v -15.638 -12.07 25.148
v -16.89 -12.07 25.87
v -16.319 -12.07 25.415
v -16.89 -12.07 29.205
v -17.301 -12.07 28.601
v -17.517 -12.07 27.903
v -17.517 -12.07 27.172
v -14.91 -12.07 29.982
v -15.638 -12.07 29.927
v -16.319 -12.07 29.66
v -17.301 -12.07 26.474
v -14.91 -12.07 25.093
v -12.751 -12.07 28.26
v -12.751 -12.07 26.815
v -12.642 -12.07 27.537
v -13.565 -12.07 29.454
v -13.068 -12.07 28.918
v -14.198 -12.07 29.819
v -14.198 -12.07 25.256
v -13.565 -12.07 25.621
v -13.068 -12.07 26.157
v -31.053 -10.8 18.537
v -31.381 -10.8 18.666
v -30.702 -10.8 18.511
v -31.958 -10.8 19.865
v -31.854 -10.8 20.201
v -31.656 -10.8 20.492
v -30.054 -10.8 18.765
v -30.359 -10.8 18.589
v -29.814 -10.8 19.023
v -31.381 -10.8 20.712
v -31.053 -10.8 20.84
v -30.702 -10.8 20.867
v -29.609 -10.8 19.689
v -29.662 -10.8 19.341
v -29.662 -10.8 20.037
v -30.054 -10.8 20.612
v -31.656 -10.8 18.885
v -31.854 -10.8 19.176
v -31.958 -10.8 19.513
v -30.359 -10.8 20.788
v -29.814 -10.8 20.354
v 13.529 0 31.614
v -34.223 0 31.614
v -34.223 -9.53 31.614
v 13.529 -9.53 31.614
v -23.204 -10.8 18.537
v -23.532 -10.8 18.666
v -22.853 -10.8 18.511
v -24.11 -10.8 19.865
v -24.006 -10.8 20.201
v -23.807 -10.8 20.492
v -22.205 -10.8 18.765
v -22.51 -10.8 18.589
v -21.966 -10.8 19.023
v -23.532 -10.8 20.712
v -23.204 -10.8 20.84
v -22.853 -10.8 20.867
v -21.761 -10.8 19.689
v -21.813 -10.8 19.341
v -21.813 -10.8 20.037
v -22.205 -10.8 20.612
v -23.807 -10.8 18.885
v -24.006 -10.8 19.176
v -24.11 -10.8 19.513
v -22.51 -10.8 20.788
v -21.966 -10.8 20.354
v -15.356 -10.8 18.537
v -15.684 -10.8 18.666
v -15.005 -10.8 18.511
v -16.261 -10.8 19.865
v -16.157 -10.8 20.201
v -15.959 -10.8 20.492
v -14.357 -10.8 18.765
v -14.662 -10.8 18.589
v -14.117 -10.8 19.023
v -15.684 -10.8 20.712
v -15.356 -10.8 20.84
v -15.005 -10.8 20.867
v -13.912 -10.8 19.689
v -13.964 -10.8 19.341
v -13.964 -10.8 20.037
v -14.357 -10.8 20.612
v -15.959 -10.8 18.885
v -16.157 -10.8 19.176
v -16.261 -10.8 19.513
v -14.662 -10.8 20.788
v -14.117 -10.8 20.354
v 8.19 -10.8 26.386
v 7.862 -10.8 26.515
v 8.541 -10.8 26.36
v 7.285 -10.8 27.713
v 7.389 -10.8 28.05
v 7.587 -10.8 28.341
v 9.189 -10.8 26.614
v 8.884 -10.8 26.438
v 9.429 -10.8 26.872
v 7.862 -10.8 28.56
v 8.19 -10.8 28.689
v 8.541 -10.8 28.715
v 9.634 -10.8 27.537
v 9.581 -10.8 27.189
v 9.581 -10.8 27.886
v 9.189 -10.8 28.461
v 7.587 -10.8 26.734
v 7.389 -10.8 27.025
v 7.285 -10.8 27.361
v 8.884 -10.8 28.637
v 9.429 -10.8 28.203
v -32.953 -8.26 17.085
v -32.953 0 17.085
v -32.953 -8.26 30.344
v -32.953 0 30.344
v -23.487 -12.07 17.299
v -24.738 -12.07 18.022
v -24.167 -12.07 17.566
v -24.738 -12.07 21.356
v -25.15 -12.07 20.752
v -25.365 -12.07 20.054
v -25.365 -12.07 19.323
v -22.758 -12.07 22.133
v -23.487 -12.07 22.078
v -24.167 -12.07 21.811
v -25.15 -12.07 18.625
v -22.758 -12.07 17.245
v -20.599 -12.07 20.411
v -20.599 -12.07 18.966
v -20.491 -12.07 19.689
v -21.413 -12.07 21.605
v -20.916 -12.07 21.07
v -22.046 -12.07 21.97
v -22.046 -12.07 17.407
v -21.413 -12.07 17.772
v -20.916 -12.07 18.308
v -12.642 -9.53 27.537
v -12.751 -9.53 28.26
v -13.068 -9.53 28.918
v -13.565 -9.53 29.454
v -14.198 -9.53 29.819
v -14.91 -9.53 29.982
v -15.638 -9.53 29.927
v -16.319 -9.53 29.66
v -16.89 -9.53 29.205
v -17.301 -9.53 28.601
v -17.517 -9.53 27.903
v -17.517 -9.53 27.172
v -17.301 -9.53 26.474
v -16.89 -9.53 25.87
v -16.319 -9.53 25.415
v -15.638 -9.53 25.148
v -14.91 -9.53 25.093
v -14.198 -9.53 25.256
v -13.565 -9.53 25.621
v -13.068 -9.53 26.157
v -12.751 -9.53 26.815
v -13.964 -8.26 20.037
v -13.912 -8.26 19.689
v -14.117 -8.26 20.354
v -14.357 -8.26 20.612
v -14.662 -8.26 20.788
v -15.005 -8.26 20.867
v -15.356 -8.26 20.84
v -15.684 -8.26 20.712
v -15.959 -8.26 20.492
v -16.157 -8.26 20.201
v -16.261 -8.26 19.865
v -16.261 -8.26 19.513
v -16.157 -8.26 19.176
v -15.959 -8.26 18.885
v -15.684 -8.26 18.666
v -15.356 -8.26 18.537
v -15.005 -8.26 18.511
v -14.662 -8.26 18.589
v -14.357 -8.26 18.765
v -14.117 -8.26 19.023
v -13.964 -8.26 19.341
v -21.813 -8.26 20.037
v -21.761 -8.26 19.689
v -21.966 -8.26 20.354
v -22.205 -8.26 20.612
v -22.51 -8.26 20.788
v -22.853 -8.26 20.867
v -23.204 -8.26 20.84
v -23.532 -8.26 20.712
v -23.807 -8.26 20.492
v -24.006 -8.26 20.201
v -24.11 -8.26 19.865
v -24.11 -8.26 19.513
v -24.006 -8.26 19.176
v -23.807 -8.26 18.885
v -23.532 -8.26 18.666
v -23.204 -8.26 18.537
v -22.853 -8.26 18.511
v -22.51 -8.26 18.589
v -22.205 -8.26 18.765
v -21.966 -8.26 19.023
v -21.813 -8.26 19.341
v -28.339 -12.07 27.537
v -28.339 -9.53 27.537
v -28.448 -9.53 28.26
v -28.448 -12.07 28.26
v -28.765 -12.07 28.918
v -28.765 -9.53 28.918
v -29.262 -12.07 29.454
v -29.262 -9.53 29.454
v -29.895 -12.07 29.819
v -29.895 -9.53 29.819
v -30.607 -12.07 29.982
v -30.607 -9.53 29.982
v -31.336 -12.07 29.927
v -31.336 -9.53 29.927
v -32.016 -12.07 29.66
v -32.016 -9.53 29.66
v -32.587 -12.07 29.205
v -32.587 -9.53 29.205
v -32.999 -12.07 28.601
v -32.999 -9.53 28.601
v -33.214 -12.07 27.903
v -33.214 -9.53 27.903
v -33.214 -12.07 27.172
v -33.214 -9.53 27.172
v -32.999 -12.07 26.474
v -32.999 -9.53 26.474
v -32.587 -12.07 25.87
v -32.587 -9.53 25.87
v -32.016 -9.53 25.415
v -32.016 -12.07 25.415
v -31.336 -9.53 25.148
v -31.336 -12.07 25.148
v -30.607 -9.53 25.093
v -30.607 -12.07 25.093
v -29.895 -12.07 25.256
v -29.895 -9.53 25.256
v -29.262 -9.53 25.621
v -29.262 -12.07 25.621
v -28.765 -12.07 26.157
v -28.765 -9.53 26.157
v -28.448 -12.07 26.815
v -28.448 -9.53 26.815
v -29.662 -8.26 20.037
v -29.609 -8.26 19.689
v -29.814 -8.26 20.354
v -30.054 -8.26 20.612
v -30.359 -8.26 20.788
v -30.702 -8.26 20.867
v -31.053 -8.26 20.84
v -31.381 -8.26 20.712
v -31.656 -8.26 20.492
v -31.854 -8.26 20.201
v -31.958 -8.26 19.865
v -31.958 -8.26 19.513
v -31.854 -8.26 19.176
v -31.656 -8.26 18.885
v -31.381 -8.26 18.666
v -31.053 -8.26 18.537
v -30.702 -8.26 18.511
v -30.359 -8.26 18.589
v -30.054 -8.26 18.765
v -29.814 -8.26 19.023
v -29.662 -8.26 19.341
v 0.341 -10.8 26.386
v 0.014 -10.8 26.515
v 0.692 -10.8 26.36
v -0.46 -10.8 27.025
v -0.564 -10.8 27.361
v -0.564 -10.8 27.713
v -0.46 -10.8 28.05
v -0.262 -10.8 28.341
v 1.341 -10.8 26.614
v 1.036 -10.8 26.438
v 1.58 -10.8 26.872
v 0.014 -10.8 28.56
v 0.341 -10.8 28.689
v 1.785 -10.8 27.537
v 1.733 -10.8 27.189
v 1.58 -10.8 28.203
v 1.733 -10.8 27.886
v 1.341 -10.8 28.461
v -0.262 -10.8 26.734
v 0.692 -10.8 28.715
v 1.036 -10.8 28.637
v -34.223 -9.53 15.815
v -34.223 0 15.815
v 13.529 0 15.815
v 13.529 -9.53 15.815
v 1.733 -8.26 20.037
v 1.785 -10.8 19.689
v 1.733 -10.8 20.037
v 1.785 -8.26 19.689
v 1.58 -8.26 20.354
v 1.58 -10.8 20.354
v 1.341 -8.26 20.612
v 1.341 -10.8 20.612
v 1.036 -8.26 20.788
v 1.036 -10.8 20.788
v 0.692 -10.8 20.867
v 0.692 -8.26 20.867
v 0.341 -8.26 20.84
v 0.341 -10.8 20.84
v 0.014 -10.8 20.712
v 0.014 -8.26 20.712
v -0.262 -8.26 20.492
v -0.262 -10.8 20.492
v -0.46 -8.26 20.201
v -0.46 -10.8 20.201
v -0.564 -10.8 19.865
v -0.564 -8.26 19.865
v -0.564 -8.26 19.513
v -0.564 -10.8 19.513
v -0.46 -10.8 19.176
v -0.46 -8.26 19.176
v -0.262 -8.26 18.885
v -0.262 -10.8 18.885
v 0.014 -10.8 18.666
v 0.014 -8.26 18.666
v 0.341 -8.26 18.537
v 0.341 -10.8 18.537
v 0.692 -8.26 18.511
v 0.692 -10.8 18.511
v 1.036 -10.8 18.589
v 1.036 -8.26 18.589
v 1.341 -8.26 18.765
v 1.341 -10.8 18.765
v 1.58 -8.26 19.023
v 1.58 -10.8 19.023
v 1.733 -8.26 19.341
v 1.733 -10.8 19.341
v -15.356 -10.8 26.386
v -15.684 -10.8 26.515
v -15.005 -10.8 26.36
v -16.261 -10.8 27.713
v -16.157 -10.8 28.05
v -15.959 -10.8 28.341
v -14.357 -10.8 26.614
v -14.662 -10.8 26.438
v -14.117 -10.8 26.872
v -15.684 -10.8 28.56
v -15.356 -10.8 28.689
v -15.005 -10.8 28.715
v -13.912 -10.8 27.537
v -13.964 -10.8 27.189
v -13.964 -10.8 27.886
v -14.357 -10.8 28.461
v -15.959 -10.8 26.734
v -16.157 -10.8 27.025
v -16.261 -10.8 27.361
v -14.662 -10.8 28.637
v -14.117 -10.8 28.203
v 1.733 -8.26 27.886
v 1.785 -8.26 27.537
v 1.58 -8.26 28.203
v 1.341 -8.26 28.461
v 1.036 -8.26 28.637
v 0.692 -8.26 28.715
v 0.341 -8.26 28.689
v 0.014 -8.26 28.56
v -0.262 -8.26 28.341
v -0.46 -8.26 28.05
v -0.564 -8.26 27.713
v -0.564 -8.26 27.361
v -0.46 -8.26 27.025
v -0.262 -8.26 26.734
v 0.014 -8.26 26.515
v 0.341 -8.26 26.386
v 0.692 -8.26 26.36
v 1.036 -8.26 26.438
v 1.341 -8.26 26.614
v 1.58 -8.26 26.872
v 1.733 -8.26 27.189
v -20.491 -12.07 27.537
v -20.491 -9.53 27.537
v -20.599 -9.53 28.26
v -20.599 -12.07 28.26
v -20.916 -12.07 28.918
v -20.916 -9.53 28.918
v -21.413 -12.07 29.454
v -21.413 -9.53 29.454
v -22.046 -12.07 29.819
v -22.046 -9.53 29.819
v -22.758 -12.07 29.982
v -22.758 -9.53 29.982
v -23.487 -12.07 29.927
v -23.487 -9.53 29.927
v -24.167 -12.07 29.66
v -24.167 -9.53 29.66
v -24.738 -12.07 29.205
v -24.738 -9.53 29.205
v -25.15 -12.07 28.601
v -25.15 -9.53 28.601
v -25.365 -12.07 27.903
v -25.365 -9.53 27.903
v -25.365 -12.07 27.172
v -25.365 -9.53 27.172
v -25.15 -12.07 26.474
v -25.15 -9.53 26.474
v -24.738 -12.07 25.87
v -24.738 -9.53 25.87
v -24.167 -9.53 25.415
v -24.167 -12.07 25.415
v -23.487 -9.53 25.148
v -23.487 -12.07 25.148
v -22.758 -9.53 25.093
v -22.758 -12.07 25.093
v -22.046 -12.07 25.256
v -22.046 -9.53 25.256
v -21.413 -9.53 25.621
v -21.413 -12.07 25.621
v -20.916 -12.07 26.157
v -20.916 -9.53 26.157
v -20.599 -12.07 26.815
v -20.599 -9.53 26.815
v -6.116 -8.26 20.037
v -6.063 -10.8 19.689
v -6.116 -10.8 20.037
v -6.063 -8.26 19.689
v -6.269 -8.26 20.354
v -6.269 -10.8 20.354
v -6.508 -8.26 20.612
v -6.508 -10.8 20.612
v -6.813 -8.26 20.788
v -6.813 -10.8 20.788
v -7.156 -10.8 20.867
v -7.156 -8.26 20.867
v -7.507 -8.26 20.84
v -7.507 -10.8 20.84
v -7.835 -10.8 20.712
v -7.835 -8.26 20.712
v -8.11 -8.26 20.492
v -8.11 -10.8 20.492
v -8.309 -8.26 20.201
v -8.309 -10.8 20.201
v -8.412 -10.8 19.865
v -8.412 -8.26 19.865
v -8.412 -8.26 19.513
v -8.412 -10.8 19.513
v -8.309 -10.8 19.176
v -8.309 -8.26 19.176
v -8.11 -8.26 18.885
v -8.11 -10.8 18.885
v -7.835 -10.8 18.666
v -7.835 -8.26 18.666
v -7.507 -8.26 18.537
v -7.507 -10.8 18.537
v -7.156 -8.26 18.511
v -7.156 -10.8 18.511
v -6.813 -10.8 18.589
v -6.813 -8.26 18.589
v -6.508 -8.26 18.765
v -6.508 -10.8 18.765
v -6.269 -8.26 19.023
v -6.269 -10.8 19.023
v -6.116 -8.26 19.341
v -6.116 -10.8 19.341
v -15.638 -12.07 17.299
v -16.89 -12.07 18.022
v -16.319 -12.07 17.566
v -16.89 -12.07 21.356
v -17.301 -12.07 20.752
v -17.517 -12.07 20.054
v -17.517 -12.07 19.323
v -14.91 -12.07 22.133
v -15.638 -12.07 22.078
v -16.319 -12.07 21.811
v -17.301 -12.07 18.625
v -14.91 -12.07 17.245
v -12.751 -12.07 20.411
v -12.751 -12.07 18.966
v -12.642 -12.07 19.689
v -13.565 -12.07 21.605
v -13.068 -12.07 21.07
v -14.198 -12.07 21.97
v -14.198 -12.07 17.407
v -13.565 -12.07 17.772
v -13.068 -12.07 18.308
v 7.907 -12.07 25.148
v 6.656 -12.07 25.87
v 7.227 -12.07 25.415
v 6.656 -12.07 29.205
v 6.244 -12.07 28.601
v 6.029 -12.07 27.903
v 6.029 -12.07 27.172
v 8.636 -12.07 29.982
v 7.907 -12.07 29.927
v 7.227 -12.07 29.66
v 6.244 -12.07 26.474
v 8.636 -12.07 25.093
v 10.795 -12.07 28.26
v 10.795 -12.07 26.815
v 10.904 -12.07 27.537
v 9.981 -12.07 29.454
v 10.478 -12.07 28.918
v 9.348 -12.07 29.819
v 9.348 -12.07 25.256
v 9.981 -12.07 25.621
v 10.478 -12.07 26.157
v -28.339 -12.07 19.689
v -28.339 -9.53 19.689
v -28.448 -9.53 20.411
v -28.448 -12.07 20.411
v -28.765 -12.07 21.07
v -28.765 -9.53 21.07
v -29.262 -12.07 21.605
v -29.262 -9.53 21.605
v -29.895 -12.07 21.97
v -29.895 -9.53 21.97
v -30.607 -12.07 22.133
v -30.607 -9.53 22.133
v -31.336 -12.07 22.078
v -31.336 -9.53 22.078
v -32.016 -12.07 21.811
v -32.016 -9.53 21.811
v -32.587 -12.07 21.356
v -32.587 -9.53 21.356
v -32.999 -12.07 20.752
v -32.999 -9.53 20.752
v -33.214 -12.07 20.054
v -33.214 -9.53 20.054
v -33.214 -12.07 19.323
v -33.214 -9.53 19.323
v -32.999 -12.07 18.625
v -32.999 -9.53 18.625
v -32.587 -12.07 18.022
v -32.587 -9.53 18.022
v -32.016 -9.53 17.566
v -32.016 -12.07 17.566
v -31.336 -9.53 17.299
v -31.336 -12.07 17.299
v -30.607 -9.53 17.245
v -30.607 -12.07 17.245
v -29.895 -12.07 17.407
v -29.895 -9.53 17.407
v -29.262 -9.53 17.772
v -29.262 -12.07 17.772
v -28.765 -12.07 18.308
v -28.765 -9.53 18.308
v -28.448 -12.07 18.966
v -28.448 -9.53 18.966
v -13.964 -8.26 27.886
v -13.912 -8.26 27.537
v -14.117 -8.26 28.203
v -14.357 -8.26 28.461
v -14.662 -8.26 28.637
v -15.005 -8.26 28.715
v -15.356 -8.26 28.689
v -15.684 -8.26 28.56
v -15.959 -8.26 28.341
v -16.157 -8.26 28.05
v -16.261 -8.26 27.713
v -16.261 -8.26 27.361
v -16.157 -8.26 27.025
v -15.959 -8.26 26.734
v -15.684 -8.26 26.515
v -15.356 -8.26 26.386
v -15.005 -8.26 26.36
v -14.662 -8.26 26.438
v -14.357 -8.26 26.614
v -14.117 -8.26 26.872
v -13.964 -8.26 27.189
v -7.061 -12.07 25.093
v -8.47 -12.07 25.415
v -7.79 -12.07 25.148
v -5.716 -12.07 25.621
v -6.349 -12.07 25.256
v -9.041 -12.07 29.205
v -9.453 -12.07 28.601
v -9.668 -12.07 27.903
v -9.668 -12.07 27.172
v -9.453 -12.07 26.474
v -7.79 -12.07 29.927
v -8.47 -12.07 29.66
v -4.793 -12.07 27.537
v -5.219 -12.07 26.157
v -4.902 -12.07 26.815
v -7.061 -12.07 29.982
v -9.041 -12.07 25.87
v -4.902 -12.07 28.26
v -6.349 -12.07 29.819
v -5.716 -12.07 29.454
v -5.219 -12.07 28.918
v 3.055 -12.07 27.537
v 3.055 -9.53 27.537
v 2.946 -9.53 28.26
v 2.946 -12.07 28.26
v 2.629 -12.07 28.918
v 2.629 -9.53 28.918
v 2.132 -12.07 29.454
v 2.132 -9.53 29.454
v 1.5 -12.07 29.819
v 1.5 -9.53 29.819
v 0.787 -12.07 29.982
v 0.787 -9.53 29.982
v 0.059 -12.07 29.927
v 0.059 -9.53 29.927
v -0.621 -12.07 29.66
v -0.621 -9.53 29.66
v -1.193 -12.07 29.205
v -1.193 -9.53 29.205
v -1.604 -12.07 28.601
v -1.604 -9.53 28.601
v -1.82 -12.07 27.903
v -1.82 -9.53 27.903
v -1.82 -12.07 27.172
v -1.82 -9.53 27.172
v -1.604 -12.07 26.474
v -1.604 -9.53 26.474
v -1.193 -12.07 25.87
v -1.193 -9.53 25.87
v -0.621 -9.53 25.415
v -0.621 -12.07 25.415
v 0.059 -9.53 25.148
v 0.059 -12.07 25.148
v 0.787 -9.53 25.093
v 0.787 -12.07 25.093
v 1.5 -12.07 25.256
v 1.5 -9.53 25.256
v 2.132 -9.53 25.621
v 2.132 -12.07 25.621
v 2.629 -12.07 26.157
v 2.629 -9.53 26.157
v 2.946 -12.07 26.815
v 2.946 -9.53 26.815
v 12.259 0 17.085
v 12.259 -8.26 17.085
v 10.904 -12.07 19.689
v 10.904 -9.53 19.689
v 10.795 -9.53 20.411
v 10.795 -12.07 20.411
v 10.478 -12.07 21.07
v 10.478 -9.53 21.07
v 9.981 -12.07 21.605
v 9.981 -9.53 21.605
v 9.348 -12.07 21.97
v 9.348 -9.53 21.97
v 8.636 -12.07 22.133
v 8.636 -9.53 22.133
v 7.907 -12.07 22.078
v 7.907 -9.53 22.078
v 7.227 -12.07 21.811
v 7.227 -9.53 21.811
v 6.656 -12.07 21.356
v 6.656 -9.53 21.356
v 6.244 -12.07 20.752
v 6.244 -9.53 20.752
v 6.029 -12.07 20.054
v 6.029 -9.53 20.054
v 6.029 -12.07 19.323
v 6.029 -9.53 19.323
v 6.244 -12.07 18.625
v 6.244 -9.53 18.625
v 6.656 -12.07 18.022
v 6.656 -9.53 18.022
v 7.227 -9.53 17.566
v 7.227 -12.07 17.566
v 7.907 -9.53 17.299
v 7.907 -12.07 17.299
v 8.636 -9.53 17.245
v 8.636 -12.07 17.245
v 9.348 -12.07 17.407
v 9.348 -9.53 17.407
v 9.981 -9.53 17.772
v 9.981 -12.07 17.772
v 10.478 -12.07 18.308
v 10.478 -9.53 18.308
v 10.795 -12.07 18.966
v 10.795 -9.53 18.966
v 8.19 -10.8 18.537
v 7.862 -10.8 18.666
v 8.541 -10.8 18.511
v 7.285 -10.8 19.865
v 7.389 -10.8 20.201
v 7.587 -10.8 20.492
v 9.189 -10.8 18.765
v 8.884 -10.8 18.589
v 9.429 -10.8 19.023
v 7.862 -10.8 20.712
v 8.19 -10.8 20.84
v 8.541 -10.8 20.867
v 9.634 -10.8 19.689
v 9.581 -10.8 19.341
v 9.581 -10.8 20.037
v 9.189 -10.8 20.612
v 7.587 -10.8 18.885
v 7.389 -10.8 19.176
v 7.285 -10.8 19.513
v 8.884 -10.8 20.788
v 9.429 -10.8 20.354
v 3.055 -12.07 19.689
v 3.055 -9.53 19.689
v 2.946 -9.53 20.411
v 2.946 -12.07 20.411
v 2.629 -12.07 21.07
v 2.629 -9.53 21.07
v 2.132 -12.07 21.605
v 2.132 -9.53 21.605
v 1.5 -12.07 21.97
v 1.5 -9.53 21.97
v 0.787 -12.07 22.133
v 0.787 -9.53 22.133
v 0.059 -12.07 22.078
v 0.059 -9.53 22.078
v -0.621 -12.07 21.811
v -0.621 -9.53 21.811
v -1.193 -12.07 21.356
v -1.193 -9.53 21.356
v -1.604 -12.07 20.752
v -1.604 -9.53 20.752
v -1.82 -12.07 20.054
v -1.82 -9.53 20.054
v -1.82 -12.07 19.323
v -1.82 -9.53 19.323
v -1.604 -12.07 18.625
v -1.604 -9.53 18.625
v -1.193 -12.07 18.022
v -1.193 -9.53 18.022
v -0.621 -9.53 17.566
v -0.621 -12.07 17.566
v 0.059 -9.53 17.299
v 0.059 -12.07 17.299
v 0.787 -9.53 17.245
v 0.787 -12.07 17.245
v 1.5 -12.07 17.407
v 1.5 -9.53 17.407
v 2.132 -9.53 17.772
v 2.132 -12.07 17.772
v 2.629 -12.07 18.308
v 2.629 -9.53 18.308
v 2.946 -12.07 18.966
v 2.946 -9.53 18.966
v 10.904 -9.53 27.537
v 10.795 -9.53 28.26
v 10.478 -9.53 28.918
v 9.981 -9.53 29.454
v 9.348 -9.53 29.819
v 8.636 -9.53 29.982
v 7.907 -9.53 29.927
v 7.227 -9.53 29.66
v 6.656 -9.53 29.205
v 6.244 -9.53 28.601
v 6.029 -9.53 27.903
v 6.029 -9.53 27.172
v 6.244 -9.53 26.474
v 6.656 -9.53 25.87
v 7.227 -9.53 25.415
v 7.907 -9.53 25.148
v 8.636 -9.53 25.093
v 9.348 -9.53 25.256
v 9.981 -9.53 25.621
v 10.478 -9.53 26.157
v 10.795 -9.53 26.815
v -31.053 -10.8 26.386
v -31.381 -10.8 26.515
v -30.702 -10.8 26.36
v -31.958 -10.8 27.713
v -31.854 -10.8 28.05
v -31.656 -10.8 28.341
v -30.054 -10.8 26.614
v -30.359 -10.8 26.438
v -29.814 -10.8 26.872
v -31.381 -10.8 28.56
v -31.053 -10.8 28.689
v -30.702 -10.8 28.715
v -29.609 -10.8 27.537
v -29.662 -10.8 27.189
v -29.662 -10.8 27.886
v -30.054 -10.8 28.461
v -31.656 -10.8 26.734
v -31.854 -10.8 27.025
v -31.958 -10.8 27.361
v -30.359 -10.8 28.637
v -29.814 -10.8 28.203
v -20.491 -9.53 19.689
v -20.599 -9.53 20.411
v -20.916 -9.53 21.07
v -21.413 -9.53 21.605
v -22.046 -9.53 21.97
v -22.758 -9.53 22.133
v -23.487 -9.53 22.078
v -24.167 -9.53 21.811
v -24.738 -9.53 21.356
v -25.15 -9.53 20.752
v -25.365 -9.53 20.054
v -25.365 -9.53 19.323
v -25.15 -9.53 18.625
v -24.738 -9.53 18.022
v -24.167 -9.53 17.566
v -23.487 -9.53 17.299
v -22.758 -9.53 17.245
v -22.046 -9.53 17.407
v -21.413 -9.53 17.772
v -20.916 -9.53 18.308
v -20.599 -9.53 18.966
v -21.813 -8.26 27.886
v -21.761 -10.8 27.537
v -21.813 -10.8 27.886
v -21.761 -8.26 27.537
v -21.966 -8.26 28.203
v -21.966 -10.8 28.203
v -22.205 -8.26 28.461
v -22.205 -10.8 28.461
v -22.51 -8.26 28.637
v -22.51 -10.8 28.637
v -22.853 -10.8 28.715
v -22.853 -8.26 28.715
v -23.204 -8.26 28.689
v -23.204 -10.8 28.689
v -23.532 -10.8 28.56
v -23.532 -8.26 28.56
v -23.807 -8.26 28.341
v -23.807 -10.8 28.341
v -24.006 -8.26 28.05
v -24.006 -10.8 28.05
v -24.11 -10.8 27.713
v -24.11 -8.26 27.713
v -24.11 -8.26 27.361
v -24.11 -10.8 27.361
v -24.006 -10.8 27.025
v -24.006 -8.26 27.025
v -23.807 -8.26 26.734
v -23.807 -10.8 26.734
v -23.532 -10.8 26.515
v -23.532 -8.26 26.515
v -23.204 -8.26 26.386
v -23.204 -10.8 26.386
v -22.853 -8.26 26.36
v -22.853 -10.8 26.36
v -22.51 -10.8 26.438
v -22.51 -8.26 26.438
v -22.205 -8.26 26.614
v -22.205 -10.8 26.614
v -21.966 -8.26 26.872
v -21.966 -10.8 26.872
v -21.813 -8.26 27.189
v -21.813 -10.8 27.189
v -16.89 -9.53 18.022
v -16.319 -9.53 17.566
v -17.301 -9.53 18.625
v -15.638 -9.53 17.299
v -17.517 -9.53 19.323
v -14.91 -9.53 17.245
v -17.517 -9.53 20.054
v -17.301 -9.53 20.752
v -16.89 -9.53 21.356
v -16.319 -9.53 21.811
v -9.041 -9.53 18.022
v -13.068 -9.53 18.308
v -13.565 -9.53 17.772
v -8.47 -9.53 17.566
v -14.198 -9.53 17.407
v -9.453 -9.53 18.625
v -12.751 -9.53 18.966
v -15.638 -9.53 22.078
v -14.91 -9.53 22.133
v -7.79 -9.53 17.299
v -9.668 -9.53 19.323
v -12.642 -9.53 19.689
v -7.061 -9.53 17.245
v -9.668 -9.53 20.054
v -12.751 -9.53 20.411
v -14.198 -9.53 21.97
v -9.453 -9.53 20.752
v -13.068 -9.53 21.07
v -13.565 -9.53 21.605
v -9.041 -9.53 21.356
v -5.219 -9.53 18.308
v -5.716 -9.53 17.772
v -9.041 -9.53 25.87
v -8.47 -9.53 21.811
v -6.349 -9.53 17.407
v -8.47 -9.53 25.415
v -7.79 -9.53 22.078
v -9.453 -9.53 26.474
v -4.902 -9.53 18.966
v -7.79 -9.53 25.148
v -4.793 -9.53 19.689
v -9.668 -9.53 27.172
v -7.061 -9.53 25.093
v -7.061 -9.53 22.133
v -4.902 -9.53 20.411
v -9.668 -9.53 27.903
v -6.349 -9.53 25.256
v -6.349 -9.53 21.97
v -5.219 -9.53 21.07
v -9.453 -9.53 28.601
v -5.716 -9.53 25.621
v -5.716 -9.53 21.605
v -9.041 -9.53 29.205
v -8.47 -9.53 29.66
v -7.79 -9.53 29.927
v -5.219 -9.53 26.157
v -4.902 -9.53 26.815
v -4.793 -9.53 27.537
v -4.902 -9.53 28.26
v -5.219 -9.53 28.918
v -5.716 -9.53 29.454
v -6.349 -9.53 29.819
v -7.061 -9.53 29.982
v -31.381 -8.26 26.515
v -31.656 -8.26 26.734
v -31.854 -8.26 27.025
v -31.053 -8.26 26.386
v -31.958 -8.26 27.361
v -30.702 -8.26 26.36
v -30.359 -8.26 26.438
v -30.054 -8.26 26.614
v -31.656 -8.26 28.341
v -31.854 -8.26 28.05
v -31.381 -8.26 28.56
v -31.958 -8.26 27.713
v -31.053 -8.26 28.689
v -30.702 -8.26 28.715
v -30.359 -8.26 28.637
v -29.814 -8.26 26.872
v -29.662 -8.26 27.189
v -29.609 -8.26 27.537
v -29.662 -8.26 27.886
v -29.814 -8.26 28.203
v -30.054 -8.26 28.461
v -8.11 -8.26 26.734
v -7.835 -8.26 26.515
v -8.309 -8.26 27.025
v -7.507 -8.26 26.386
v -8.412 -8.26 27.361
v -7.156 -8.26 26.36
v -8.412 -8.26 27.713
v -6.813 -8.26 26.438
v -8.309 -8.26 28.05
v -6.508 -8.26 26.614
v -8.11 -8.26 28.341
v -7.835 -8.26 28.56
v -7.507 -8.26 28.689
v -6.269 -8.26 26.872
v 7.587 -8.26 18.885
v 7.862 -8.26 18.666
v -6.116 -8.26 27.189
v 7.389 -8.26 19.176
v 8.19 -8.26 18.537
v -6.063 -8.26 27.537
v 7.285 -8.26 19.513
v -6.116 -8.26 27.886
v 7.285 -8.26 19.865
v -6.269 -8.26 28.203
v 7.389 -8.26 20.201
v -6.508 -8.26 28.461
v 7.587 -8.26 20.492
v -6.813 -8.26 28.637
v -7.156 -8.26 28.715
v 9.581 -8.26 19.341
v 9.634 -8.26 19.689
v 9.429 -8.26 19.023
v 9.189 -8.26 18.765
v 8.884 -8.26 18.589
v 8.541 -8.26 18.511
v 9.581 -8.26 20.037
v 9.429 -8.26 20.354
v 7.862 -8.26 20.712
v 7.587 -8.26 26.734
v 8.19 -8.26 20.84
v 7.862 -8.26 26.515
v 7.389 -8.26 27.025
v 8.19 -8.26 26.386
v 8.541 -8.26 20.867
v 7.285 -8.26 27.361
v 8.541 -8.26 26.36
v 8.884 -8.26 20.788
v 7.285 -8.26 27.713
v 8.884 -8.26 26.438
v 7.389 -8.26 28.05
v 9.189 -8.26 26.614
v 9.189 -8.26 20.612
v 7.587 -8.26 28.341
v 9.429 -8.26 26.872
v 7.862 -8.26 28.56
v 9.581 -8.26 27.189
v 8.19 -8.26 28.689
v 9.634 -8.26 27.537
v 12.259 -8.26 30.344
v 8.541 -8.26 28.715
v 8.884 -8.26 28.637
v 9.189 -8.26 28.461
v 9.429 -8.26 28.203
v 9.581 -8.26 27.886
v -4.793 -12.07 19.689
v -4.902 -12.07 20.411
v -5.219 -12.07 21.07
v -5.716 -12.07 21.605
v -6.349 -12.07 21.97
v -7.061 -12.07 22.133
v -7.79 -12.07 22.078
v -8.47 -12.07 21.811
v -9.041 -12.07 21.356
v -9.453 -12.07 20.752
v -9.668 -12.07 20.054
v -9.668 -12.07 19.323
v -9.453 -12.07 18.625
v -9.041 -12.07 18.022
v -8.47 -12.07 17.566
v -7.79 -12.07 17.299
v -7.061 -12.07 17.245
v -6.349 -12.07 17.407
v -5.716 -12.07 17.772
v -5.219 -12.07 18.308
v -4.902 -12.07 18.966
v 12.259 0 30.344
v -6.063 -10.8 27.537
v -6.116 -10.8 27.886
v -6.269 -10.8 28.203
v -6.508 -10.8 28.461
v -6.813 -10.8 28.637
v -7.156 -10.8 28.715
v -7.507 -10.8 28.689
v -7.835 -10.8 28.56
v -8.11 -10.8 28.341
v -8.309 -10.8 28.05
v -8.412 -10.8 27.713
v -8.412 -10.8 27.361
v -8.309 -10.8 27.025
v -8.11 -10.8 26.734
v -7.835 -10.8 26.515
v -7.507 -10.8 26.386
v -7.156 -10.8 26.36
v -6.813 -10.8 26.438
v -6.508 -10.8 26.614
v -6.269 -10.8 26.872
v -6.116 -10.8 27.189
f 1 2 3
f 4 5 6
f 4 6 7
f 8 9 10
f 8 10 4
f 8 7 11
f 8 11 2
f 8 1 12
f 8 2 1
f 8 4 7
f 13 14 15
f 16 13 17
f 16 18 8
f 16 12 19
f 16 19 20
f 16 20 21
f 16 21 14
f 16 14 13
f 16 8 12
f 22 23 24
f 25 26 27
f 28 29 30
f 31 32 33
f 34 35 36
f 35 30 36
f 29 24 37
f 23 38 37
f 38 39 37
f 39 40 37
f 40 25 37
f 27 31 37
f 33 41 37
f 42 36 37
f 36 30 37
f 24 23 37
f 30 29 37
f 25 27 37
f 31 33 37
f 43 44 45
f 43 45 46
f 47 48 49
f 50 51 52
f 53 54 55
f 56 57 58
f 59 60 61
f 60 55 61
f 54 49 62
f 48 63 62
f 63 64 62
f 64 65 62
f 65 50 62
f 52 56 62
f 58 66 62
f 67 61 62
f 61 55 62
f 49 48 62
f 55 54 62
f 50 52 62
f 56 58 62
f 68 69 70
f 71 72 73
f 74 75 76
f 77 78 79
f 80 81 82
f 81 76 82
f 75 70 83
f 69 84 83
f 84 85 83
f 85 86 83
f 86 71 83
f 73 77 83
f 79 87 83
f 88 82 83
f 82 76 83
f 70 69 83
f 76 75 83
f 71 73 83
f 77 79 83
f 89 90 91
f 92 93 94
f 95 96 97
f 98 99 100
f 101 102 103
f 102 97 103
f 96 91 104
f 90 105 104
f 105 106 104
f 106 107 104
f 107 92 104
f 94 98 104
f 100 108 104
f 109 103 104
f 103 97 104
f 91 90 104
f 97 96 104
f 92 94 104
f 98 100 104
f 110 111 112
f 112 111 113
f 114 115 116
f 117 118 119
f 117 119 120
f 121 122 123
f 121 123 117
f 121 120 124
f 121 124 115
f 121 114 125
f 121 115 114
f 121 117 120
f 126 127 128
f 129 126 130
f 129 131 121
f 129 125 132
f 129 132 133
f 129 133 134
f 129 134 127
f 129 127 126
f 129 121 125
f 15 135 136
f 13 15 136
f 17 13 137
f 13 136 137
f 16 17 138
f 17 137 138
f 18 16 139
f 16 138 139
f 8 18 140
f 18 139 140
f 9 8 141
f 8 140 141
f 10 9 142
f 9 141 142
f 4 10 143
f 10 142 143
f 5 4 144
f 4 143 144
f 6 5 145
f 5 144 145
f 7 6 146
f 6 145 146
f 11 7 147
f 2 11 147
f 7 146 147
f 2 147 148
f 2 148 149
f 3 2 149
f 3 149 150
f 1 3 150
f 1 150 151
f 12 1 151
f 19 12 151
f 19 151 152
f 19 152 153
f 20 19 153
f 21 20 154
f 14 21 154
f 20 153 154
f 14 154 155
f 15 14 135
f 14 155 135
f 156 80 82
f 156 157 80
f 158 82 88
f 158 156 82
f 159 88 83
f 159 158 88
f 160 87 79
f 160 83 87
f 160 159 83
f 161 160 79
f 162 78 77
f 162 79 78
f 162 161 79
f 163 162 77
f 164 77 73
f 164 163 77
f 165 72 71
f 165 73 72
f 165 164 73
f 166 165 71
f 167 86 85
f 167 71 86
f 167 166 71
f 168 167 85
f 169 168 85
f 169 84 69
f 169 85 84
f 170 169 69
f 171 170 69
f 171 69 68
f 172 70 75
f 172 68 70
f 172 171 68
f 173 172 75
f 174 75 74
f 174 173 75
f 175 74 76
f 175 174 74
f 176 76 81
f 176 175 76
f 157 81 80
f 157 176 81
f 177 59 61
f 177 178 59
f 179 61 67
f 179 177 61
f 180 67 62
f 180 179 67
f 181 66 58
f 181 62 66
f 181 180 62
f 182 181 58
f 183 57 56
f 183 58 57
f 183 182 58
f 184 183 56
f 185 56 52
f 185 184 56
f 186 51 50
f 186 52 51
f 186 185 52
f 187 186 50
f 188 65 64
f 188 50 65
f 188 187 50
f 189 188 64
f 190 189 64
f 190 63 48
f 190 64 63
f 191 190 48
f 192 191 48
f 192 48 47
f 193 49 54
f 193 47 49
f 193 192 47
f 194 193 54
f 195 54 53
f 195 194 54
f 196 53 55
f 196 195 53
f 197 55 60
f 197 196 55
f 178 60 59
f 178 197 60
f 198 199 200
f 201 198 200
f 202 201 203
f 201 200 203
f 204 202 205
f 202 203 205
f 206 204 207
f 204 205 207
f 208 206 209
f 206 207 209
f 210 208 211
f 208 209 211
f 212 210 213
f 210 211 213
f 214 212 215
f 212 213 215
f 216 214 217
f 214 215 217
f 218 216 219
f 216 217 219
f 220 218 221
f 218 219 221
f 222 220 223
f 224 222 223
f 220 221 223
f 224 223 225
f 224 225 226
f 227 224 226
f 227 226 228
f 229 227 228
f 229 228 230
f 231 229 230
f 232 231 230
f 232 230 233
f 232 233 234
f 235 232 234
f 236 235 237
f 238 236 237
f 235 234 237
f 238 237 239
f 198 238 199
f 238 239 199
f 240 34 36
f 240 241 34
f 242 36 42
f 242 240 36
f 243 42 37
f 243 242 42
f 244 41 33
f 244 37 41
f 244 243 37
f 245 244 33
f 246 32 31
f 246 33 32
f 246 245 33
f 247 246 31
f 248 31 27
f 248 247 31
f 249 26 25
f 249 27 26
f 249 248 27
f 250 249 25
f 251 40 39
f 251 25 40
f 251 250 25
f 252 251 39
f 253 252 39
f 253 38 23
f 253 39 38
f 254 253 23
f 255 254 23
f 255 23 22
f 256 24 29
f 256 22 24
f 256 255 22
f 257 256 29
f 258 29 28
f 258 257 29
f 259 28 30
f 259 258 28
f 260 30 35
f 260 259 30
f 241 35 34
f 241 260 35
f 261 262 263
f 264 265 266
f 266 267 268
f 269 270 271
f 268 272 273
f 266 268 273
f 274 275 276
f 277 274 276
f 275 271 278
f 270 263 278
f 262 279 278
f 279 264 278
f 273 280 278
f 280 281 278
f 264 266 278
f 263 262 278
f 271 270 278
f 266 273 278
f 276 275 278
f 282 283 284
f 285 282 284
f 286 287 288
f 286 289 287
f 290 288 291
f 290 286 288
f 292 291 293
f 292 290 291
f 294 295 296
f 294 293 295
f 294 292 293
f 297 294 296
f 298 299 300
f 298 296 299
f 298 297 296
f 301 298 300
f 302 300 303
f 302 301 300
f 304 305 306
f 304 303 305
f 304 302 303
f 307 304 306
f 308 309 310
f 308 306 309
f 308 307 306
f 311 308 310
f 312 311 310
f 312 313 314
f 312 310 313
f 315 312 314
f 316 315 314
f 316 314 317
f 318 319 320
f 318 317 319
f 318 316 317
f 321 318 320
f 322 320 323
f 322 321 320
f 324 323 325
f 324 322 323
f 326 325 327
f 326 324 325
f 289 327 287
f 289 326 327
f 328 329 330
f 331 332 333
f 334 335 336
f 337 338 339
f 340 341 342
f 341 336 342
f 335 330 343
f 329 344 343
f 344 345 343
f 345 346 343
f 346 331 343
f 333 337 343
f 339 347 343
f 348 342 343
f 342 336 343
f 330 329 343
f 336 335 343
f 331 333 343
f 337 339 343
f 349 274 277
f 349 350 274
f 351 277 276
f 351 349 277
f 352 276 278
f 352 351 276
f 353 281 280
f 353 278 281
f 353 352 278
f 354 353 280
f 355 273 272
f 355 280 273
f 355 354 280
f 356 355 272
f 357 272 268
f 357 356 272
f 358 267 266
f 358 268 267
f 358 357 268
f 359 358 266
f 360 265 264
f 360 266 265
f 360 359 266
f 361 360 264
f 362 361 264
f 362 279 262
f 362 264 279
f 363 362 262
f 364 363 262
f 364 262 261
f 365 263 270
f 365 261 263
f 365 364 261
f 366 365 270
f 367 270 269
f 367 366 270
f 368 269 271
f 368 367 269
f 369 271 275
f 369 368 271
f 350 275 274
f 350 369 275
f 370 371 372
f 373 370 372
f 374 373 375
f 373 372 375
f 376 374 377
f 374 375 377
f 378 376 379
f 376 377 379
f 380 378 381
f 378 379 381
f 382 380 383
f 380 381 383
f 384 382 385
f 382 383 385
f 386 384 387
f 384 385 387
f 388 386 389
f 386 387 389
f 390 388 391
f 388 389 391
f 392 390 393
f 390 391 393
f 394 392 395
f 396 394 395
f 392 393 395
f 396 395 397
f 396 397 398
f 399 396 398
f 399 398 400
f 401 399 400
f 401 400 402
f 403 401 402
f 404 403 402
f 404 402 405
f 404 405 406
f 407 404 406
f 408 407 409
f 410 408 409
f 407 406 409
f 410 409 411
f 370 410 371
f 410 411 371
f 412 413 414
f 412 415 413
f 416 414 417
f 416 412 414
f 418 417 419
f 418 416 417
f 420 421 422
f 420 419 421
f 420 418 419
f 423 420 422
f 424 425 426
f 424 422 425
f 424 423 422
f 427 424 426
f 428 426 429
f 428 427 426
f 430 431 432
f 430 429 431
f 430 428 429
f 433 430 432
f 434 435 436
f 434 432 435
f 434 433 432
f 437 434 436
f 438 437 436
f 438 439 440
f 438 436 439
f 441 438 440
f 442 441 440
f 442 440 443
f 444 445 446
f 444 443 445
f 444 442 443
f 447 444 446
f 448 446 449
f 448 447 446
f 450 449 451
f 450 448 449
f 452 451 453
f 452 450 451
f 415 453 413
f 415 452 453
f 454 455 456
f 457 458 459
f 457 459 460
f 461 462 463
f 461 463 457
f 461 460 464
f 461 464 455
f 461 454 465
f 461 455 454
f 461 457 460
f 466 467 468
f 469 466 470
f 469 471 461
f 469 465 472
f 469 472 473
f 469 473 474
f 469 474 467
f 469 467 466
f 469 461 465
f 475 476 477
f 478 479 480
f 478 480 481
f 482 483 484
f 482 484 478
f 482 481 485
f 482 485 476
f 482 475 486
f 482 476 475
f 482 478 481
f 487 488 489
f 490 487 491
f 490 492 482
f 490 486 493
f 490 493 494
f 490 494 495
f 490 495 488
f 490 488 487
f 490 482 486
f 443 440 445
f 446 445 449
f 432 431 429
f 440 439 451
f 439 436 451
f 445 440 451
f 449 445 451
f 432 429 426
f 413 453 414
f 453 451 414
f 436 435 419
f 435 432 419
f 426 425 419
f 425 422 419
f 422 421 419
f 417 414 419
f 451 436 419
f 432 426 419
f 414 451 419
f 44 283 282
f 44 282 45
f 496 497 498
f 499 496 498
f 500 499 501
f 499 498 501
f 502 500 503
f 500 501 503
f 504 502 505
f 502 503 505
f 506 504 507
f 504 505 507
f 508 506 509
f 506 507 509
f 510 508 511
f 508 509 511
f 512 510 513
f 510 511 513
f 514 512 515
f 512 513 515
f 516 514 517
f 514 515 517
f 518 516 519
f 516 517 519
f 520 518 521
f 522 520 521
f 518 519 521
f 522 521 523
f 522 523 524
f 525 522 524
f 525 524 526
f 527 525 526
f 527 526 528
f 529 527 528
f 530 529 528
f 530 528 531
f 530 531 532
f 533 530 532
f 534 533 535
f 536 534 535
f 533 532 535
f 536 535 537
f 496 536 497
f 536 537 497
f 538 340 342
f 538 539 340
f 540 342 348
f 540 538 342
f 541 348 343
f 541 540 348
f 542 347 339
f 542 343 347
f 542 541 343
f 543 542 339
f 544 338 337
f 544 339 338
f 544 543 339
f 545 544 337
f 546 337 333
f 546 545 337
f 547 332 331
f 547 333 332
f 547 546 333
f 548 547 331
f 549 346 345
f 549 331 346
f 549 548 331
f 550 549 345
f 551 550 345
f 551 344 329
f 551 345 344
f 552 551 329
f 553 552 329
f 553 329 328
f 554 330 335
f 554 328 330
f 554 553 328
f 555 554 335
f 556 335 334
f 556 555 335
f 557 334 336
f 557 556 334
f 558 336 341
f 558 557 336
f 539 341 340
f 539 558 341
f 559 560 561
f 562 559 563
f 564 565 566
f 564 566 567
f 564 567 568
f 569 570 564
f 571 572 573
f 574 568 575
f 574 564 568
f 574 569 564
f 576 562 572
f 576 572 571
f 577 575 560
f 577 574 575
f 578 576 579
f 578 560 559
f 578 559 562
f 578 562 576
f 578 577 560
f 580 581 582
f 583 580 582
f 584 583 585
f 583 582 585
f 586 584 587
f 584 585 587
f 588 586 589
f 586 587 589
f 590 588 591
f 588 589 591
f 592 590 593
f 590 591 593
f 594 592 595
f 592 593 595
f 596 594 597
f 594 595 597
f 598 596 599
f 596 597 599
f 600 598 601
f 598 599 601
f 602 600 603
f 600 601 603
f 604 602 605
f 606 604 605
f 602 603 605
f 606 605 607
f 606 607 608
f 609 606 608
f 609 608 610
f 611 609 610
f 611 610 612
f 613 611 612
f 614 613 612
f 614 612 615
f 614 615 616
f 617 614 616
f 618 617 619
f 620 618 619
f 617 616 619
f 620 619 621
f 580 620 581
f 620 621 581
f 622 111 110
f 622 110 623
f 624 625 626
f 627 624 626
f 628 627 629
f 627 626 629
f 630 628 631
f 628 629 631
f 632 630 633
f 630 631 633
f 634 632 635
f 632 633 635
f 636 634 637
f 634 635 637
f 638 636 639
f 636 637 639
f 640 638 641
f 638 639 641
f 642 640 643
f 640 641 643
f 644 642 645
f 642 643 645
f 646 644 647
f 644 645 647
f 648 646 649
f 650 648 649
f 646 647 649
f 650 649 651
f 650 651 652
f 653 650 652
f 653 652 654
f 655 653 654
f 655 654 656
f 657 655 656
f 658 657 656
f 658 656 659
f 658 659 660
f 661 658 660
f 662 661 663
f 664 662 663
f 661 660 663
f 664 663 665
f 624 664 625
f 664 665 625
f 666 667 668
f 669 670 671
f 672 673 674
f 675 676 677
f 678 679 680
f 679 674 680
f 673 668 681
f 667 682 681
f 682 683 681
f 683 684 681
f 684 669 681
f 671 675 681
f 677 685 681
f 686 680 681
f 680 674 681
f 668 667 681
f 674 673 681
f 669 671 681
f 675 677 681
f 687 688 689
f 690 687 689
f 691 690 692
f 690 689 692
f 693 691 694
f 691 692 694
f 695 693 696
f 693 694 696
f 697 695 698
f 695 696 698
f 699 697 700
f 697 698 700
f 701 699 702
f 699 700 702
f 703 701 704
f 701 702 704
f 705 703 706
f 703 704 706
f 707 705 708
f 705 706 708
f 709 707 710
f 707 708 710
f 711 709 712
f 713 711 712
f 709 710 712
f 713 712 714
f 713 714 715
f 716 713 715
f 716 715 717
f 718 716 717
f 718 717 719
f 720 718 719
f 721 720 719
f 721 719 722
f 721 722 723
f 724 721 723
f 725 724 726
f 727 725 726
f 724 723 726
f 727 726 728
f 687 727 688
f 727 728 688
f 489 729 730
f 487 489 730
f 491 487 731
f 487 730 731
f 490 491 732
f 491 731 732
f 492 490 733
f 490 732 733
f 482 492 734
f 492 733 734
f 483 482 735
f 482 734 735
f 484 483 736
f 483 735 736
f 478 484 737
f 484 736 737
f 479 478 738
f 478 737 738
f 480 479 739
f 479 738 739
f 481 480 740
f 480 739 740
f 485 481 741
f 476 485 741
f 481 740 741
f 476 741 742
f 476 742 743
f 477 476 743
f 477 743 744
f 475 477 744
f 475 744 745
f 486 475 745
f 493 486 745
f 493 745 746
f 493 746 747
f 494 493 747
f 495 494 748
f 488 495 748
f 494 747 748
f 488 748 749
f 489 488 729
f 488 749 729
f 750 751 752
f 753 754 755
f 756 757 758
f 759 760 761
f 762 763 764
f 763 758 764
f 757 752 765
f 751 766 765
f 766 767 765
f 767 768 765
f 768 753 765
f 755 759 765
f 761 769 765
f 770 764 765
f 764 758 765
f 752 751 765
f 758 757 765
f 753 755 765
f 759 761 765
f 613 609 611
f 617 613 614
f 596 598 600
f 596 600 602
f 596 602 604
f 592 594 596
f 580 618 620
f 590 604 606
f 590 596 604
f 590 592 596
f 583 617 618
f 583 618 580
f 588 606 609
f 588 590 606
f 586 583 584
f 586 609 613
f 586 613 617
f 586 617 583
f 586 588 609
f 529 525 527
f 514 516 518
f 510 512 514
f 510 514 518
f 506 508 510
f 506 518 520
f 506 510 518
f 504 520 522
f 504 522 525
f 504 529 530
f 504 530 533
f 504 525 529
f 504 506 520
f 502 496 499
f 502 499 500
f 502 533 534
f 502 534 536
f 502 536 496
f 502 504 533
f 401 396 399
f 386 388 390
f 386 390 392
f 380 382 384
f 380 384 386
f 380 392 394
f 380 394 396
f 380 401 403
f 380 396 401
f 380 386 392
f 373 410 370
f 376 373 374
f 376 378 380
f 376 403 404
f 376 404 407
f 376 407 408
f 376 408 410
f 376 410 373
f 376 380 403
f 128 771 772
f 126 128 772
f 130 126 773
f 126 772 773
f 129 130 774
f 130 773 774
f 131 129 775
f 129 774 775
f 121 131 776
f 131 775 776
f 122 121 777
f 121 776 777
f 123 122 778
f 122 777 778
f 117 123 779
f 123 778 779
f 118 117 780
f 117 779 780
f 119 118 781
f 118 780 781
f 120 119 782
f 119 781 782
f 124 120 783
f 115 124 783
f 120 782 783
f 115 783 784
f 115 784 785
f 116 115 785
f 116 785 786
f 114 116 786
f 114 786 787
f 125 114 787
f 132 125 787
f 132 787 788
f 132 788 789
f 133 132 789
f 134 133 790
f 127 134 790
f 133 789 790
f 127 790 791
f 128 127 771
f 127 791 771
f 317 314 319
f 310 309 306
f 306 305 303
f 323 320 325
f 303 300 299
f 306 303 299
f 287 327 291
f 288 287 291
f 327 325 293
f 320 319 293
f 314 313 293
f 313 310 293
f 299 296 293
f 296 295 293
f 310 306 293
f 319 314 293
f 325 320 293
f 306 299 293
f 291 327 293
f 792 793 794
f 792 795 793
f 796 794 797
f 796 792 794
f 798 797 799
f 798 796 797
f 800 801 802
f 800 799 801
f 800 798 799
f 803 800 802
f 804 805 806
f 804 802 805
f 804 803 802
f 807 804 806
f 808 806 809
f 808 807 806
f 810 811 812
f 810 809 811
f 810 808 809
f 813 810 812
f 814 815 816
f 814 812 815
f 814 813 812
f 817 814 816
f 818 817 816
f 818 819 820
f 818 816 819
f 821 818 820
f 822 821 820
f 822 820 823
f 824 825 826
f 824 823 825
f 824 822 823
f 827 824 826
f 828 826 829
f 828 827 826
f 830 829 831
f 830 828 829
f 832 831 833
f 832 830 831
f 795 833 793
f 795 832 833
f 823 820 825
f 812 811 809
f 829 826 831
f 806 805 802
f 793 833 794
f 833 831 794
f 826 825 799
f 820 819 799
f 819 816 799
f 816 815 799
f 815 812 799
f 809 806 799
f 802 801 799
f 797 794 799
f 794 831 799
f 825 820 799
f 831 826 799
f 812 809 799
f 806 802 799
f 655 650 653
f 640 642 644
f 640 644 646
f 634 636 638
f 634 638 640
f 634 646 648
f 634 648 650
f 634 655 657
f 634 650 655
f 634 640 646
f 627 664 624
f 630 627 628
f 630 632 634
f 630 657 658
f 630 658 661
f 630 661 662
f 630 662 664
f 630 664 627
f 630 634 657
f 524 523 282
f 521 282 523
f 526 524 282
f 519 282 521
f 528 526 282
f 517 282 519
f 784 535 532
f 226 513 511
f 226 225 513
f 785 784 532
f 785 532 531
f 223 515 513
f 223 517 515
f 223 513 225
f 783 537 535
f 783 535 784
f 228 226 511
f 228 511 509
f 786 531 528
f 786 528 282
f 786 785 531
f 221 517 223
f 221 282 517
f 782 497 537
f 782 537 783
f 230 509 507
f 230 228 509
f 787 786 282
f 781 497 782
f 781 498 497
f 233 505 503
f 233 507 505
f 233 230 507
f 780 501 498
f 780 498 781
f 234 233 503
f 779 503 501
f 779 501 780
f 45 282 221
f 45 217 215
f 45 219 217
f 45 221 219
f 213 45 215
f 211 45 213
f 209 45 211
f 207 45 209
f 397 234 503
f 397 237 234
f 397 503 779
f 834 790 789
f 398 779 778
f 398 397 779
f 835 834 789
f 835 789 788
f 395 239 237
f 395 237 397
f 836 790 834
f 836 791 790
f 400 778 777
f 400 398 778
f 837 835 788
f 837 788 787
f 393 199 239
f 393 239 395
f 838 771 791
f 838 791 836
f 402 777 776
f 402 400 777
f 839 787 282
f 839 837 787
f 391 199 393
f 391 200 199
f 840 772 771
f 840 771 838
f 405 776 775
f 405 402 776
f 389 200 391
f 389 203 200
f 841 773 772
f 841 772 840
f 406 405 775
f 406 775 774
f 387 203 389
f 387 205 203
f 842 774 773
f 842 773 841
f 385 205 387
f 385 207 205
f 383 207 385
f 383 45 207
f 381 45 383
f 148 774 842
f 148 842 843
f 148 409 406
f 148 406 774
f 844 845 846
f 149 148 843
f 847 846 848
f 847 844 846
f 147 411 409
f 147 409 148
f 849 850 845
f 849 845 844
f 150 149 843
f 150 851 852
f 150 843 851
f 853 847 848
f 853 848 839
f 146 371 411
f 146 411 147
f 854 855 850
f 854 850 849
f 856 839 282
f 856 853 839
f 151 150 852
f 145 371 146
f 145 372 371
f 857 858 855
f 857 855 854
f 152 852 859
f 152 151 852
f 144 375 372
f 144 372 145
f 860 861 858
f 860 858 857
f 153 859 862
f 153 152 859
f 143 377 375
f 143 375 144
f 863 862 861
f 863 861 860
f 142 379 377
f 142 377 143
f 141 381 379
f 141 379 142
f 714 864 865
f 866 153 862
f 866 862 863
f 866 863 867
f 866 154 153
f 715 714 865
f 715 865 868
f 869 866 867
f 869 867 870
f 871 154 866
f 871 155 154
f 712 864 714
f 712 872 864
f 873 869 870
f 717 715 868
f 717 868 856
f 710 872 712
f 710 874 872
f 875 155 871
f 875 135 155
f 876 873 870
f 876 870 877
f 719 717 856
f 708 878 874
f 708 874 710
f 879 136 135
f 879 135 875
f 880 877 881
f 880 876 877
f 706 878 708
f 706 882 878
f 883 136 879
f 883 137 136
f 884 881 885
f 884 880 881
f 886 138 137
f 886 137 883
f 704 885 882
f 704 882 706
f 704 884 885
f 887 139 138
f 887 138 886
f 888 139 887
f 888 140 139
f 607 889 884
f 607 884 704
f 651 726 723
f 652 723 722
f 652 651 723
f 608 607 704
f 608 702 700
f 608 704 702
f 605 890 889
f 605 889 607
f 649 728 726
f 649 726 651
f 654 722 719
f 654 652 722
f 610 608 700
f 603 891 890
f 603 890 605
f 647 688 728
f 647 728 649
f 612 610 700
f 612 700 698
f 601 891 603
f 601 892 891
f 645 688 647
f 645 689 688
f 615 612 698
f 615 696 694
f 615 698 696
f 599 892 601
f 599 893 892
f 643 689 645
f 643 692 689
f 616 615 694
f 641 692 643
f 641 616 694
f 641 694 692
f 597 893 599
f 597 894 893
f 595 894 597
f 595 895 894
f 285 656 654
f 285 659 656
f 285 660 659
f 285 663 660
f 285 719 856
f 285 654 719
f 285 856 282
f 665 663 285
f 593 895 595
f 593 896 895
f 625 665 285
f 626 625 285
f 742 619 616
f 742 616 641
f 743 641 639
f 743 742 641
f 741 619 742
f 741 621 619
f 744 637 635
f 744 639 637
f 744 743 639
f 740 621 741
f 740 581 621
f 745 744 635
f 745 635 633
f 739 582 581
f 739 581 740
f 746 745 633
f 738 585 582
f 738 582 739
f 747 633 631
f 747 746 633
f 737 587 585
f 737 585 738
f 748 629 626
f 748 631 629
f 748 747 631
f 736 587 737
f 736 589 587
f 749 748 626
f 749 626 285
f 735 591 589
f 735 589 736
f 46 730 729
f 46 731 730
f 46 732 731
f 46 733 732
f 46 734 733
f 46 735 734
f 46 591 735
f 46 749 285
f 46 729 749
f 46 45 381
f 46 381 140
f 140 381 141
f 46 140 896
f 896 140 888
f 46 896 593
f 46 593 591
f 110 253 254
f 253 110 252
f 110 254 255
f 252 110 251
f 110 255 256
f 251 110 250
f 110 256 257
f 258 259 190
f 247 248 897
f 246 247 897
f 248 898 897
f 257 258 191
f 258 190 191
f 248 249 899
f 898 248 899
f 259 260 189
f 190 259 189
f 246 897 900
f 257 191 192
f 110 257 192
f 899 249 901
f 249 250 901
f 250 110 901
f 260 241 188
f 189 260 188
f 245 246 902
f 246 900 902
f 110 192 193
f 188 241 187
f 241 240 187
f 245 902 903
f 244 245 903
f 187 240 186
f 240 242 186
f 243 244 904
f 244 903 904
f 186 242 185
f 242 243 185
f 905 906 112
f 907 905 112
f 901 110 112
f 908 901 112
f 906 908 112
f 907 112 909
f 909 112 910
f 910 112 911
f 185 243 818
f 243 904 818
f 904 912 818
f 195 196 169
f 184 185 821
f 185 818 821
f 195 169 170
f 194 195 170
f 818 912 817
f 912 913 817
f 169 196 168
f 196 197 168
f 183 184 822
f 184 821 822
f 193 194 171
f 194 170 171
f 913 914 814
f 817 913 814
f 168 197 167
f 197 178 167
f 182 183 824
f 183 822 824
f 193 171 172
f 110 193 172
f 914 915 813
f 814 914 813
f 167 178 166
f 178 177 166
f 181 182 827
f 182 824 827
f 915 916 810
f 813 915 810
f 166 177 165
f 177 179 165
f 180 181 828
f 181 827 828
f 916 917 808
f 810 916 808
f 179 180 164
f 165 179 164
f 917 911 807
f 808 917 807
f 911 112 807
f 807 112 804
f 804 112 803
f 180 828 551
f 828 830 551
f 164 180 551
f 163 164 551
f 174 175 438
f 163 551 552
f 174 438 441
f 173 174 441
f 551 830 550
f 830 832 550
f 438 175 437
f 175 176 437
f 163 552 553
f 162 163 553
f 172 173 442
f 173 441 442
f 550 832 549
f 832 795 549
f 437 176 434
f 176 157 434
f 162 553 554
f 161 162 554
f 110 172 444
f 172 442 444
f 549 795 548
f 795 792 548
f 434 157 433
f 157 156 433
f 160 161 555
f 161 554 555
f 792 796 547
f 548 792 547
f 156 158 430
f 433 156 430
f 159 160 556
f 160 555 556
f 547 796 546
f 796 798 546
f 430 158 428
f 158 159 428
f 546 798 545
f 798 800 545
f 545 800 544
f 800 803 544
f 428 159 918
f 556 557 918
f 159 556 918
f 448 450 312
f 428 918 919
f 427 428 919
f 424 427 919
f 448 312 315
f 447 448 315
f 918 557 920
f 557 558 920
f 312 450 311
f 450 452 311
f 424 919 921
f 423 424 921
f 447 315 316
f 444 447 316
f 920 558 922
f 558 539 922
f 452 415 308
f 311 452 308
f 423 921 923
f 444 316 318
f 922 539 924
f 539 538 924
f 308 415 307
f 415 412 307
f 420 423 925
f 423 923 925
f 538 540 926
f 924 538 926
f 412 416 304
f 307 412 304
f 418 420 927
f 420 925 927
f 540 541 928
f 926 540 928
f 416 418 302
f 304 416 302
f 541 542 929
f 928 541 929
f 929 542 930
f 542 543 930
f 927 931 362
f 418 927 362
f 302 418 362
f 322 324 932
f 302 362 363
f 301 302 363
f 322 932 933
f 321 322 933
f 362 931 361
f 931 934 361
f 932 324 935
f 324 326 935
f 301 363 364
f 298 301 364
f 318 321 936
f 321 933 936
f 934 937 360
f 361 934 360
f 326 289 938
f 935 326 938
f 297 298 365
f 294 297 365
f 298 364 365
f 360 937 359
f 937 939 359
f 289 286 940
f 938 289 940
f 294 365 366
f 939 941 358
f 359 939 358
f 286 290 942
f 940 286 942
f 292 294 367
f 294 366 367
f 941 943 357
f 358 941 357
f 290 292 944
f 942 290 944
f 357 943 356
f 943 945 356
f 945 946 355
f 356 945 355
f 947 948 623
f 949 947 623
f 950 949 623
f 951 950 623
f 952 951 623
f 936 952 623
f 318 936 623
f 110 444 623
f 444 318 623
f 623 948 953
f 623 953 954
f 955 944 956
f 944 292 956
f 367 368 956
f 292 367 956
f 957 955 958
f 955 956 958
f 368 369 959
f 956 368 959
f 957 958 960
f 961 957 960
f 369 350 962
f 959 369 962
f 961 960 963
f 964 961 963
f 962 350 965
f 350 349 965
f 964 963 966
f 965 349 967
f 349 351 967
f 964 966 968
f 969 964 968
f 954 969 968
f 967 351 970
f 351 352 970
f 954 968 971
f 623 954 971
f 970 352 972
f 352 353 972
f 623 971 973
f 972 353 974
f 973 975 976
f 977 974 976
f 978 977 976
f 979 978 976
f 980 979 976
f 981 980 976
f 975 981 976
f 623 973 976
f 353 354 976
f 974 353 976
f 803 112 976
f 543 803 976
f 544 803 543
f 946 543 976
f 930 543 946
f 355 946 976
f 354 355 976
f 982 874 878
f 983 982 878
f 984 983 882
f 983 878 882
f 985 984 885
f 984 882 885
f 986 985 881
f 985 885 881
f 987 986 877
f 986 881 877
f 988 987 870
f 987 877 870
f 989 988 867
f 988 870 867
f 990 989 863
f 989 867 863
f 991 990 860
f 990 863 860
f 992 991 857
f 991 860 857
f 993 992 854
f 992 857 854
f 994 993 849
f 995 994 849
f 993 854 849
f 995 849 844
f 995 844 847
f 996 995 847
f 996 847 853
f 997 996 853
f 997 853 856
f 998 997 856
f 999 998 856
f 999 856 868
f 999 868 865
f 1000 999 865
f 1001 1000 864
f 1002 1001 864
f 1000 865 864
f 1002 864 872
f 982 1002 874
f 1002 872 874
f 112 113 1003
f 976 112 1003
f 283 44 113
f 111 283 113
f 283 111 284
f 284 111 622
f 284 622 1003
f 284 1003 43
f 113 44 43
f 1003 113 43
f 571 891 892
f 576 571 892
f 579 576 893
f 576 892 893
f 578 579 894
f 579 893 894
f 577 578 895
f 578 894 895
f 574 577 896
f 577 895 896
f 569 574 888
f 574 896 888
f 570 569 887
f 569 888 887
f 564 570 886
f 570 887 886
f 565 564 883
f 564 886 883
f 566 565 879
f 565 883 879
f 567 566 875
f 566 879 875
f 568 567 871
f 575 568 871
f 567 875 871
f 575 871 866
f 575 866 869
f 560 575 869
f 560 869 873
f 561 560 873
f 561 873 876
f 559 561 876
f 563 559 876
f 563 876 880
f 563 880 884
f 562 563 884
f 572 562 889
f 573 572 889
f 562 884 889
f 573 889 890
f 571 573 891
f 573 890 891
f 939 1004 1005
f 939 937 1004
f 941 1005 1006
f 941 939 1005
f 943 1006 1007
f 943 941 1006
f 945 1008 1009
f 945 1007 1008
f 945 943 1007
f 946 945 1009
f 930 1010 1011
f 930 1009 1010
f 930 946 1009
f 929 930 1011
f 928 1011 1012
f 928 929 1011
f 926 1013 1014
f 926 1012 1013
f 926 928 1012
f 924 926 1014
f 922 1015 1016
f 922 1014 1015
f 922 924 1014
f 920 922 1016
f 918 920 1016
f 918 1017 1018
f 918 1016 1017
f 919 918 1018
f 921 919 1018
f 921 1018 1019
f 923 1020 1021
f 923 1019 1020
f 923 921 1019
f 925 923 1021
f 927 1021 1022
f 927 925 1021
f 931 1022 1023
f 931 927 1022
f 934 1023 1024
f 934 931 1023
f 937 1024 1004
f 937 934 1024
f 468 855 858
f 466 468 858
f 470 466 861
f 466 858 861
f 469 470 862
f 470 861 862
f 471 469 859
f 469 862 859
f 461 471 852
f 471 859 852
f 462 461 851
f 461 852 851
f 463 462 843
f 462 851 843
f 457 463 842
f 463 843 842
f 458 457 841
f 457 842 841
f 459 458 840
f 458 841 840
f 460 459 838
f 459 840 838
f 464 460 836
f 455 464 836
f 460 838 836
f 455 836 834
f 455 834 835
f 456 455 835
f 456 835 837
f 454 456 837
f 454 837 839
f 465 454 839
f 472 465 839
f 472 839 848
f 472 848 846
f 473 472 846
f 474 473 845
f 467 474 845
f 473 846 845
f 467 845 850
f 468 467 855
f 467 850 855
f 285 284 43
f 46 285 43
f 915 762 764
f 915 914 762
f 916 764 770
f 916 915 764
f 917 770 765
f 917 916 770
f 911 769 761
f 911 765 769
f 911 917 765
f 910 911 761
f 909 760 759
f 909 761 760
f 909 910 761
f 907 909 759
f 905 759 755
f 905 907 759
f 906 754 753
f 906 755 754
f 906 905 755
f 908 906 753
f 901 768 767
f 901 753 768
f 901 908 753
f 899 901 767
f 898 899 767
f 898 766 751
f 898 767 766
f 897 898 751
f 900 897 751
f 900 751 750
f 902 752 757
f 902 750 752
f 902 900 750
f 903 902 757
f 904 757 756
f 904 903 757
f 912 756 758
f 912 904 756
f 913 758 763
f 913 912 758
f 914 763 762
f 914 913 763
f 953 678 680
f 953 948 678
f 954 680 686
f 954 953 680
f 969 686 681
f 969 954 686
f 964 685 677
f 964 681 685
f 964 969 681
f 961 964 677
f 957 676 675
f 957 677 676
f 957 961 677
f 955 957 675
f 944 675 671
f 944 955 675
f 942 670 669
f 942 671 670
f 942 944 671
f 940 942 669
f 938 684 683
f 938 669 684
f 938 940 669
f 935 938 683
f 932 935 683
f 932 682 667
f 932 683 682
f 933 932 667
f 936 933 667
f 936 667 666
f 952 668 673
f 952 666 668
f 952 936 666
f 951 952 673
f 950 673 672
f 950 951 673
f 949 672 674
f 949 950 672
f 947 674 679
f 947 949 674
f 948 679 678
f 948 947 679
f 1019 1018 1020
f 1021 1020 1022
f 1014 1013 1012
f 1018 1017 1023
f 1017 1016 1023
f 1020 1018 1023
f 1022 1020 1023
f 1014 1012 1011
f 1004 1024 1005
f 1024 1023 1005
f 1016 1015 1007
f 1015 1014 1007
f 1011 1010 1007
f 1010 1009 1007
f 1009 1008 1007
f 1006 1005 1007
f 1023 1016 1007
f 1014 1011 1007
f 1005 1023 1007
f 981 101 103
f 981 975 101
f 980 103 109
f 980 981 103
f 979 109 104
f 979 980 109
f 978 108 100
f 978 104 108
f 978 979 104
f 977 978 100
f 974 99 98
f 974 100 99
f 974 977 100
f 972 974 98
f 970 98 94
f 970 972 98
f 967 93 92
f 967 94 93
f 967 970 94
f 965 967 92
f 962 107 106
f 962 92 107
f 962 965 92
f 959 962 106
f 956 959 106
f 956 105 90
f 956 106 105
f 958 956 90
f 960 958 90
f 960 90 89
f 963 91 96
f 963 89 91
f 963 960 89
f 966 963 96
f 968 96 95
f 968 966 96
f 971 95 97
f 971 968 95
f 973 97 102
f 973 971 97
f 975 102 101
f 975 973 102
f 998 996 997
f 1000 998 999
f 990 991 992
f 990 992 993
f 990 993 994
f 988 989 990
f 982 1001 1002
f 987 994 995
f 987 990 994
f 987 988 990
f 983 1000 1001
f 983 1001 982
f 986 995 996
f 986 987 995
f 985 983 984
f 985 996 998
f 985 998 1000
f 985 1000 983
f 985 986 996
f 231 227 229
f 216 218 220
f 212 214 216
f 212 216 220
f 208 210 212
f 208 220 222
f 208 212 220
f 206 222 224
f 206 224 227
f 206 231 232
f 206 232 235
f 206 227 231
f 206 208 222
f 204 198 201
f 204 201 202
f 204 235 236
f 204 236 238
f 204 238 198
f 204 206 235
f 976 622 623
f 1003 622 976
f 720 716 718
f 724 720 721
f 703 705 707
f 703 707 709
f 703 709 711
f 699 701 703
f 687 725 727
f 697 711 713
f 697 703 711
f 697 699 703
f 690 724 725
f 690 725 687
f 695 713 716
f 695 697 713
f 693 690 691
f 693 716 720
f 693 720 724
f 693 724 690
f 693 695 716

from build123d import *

# Parameters (mm, degrees)
F0_W     = 47.752
F0_H     = 15.7988
F1_DEPTH = 9.53
F2_R     = 2.4511
F3_DEPTH = 2.54
F4_T     = -1.27


with BuildPart() as f1:
    # F0 (on Front) → F1 (new body)
    with BuildSketch(Plane.XZ):
        with Locations((-10.3473756462, 23.7146833966)):
            Rectangle(F0_W, F0_H)
    extrude(amount=F1_DEPTH)

    # F2 (on face) → F3 (join)
    with BuildSketch(Plane.XZ.offset(9.53)):
        with Locations((8.4527879953, 27.5373833966)):
            Circle(F2_R)
        with Locations((8.4527879953, 19.6887833966)):
            Circle(F2_R)
        with Locations((0.6041879953, 27.5373833966)):
            Circle(F2_R)
        with Locations((0.6041879953, 19.6887833966)):
            Circle(F2_R)
        with Locations((-7.2444120047, 27.5373833966)):
            Circle(F2_R)
        with Locations((-7.2444120047, 19.6887833966)):
            Circle(F2_R)
        with Locations((-15.0930120047, 27.5373833966)):
            Circle(F2_R)
        with Locations((-15.0930120047, 19.6887833966)):
            Circle(F2_R)
        with Locations((-22.9416120047, 27.5373833966)):
            Circle(F2_R)
        with Locations((-22.9416120047, 19.6887833966)):
            Circle(F2_R)
        with Locations((-30.7902120047, 27.5373833966)):
            Circle(F2_R)
        with Locations((-30.7902120047, 19.6887833966)):
            Circle(F2_R)
    extrude(amount=F3_DEPTH)

    # F4
    f4_openings = [f1.faces().sort_by_distance(p)[0] for p in [
        (-10.347376, 0, 23.714683),
    ]]
    offset(amount=F4_T, openings=f4_openings, kind=Kind.INTERSECTION)


solid = f1.part
